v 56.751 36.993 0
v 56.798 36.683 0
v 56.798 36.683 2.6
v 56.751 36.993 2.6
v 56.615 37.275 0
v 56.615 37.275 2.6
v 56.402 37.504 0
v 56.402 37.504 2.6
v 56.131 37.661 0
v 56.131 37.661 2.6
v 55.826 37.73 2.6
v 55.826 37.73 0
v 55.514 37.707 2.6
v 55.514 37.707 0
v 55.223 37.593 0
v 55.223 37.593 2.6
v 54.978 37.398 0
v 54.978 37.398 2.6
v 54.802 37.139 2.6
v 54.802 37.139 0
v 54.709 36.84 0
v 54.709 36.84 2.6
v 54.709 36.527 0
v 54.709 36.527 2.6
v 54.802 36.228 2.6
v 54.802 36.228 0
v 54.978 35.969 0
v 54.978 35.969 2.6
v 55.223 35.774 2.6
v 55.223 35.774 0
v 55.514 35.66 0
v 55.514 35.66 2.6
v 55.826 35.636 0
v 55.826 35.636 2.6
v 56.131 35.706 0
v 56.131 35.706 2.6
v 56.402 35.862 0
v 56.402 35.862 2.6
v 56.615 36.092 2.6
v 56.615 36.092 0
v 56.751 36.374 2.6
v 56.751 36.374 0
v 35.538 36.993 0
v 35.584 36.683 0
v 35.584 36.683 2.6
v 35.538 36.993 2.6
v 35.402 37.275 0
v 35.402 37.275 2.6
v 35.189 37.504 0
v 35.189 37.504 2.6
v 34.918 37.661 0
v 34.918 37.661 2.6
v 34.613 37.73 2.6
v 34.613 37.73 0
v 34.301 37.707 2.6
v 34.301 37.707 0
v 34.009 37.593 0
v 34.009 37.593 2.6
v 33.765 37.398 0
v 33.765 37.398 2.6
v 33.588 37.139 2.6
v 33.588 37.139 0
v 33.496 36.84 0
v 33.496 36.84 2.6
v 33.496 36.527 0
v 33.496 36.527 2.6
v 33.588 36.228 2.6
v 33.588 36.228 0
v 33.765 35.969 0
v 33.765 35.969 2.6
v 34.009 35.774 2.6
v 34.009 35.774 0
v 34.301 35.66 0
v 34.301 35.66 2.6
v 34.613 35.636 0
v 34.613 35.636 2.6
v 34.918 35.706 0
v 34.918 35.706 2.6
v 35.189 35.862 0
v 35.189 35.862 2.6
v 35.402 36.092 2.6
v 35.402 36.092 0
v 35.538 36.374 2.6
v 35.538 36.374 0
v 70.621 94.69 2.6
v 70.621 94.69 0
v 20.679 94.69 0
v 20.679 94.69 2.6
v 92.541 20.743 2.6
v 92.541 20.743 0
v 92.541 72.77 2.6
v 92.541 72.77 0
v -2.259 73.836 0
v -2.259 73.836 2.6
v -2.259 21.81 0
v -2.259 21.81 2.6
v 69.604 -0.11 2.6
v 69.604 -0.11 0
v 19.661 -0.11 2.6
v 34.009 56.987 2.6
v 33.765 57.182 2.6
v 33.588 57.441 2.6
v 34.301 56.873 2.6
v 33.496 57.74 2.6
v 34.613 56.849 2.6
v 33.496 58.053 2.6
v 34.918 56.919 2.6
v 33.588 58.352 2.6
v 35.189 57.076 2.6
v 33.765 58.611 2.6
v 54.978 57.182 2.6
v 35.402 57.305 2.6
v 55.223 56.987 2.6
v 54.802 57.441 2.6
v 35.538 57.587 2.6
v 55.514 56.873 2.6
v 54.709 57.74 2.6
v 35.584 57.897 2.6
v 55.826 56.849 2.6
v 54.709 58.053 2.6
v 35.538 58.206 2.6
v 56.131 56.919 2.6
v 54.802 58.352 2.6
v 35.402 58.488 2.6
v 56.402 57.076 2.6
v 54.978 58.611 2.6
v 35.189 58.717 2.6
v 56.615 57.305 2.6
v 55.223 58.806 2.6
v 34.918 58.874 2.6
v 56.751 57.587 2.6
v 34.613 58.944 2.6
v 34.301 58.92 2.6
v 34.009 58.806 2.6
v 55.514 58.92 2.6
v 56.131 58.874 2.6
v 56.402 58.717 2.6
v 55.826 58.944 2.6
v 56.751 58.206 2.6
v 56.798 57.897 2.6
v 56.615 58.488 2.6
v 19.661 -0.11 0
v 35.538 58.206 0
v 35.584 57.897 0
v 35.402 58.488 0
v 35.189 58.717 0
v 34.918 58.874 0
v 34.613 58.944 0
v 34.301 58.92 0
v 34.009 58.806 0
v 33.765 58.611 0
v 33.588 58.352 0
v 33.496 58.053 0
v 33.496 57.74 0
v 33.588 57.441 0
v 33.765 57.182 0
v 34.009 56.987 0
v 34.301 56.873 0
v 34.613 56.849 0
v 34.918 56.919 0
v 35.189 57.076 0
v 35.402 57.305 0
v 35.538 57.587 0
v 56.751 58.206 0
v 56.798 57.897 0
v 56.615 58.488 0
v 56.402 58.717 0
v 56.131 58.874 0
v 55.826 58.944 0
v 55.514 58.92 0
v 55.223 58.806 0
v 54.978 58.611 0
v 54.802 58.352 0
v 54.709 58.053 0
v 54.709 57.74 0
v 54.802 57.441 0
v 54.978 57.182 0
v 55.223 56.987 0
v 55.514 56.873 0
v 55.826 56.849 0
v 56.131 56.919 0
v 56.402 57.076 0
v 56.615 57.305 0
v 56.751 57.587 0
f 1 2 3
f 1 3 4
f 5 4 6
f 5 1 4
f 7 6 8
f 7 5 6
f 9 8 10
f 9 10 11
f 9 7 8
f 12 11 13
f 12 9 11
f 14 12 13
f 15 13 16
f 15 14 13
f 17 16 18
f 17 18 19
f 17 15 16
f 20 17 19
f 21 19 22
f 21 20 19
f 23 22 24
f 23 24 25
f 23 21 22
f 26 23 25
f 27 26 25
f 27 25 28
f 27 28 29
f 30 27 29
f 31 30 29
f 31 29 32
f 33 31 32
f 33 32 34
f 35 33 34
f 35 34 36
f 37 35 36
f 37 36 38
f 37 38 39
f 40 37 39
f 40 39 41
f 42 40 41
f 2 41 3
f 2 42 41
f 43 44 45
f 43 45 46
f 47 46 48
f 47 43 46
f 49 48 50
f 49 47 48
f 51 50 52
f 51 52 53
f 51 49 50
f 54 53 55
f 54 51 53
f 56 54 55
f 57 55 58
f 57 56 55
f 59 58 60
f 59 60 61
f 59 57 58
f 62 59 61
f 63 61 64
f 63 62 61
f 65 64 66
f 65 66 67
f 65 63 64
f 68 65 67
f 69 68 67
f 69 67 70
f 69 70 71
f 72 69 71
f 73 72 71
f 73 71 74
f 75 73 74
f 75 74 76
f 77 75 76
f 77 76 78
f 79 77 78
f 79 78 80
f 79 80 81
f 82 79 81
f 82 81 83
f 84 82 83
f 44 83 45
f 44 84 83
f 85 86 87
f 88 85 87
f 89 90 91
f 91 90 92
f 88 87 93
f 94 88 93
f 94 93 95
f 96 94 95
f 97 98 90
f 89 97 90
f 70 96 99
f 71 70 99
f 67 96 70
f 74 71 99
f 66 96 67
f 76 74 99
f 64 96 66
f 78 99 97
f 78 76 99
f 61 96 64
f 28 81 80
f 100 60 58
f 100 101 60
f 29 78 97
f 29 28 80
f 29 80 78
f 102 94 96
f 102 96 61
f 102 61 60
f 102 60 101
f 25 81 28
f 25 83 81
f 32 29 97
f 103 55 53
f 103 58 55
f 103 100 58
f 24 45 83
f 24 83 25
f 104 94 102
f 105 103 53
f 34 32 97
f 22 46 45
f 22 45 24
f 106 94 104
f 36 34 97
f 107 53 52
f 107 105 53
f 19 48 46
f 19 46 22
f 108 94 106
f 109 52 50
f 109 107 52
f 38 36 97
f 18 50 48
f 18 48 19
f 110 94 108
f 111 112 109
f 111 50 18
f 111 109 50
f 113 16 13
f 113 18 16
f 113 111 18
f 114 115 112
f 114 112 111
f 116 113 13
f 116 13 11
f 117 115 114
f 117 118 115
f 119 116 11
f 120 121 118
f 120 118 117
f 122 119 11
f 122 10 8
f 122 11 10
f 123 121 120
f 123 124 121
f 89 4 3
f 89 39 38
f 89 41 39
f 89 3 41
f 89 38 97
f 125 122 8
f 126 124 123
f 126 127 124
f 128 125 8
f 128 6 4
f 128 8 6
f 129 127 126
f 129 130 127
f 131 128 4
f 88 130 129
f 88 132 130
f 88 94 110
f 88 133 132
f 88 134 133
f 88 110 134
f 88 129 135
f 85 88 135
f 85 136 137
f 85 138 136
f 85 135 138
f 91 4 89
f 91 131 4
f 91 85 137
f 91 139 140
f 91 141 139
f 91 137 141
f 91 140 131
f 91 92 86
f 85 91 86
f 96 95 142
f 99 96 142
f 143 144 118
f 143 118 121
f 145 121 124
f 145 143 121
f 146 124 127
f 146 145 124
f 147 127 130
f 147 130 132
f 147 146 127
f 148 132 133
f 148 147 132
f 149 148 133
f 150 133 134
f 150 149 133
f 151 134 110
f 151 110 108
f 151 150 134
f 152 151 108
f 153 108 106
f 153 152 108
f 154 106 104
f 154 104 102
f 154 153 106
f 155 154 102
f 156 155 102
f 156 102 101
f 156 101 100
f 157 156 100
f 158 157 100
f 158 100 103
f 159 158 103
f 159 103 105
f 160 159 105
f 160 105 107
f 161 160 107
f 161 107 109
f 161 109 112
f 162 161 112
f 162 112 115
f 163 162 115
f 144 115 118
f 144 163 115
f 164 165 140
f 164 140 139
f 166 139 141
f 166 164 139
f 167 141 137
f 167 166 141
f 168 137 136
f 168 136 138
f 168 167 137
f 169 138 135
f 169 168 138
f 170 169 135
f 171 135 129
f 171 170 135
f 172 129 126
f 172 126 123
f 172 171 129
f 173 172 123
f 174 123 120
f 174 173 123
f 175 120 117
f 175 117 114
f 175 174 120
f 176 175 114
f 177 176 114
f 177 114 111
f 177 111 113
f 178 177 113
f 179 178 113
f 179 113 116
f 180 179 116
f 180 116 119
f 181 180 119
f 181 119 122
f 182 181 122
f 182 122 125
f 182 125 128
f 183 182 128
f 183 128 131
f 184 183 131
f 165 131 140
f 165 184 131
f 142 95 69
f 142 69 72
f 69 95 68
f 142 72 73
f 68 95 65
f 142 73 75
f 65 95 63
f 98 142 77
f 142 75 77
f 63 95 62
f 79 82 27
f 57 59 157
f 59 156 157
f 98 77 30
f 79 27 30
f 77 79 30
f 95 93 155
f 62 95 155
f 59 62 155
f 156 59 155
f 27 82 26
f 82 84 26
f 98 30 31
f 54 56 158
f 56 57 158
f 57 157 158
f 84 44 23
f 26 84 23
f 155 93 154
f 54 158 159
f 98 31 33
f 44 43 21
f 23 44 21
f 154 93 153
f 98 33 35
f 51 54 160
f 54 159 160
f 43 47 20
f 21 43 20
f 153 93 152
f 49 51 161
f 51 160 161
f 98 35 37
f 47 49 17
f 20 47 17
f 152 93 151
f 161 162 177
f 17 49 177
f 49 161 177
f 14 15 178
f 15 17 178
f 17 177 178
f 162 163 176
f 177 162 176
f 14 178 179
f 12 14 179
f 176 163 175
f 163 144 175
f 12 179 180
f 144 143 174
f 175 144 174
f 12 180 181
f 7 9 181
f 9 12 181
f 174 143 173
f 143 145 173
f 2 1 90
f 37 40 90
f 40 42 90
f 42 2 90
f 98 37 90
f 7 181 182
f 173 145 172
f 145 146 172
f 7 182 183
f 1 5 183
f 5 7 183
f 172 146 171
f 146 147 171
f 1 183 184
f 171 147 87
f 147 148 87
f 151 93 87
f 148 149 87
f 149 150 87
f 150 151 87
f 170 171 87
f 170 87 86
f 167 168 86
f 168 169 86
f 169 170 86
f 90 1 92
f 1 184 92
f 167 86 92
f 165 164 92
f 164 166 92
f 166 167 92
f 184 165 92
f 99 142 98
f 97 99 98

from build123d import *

# Parameters (mm, degrees)
BOSS_EXTRUDE1_DEPTH = 2.6
CAVITY1_OUTLINE_R   = 1.05
CAVITY1_DEPTH       = 2.6


# Read off the part's stored shape, not the designer's step: Cavity1
with BuildPart() as part:
    # Sketch1 → Boss-Extrude1 (new body)
    with BuildSketch(Plane.XY):
        Polygon((20.678672923, 94.689954591), (-2.25890757, 73.836480034), (-2.25890757, 21.810264808), (19.661402647, -0.110045409), (69.603511937, -0.110045409), (92.54109243, 20.743429149), (92.54109243, 72.769644374), (70.620782213, 94.689954591), align=None)
    extrude(amount=BOSS_EXTRUDE1_DEPTH)

    # Cavity1 outline → Cavity1 (cut)
    with BuildSketch(Plane.XY):
        with Locations((34.534490712, 57.896556309)):
            Circle(CAVITY1_OUTLINE_R)
        with Locations((34.534490712, 36.683352873)):
            Circle(CAVITY1_OUTLINE_R)
        with Locations((55.747694148, 57.896556309)):
            Circle(CAVITY1_OUTLINE_R)
        with Locations((55.747694148, 36.683352873)):
            Circle(CAVITY1_OUTLINE_R)
    extrude(amount=CAVITY1_DEPTH, mode=Mode.SUBTRACT)


solid = part.part
